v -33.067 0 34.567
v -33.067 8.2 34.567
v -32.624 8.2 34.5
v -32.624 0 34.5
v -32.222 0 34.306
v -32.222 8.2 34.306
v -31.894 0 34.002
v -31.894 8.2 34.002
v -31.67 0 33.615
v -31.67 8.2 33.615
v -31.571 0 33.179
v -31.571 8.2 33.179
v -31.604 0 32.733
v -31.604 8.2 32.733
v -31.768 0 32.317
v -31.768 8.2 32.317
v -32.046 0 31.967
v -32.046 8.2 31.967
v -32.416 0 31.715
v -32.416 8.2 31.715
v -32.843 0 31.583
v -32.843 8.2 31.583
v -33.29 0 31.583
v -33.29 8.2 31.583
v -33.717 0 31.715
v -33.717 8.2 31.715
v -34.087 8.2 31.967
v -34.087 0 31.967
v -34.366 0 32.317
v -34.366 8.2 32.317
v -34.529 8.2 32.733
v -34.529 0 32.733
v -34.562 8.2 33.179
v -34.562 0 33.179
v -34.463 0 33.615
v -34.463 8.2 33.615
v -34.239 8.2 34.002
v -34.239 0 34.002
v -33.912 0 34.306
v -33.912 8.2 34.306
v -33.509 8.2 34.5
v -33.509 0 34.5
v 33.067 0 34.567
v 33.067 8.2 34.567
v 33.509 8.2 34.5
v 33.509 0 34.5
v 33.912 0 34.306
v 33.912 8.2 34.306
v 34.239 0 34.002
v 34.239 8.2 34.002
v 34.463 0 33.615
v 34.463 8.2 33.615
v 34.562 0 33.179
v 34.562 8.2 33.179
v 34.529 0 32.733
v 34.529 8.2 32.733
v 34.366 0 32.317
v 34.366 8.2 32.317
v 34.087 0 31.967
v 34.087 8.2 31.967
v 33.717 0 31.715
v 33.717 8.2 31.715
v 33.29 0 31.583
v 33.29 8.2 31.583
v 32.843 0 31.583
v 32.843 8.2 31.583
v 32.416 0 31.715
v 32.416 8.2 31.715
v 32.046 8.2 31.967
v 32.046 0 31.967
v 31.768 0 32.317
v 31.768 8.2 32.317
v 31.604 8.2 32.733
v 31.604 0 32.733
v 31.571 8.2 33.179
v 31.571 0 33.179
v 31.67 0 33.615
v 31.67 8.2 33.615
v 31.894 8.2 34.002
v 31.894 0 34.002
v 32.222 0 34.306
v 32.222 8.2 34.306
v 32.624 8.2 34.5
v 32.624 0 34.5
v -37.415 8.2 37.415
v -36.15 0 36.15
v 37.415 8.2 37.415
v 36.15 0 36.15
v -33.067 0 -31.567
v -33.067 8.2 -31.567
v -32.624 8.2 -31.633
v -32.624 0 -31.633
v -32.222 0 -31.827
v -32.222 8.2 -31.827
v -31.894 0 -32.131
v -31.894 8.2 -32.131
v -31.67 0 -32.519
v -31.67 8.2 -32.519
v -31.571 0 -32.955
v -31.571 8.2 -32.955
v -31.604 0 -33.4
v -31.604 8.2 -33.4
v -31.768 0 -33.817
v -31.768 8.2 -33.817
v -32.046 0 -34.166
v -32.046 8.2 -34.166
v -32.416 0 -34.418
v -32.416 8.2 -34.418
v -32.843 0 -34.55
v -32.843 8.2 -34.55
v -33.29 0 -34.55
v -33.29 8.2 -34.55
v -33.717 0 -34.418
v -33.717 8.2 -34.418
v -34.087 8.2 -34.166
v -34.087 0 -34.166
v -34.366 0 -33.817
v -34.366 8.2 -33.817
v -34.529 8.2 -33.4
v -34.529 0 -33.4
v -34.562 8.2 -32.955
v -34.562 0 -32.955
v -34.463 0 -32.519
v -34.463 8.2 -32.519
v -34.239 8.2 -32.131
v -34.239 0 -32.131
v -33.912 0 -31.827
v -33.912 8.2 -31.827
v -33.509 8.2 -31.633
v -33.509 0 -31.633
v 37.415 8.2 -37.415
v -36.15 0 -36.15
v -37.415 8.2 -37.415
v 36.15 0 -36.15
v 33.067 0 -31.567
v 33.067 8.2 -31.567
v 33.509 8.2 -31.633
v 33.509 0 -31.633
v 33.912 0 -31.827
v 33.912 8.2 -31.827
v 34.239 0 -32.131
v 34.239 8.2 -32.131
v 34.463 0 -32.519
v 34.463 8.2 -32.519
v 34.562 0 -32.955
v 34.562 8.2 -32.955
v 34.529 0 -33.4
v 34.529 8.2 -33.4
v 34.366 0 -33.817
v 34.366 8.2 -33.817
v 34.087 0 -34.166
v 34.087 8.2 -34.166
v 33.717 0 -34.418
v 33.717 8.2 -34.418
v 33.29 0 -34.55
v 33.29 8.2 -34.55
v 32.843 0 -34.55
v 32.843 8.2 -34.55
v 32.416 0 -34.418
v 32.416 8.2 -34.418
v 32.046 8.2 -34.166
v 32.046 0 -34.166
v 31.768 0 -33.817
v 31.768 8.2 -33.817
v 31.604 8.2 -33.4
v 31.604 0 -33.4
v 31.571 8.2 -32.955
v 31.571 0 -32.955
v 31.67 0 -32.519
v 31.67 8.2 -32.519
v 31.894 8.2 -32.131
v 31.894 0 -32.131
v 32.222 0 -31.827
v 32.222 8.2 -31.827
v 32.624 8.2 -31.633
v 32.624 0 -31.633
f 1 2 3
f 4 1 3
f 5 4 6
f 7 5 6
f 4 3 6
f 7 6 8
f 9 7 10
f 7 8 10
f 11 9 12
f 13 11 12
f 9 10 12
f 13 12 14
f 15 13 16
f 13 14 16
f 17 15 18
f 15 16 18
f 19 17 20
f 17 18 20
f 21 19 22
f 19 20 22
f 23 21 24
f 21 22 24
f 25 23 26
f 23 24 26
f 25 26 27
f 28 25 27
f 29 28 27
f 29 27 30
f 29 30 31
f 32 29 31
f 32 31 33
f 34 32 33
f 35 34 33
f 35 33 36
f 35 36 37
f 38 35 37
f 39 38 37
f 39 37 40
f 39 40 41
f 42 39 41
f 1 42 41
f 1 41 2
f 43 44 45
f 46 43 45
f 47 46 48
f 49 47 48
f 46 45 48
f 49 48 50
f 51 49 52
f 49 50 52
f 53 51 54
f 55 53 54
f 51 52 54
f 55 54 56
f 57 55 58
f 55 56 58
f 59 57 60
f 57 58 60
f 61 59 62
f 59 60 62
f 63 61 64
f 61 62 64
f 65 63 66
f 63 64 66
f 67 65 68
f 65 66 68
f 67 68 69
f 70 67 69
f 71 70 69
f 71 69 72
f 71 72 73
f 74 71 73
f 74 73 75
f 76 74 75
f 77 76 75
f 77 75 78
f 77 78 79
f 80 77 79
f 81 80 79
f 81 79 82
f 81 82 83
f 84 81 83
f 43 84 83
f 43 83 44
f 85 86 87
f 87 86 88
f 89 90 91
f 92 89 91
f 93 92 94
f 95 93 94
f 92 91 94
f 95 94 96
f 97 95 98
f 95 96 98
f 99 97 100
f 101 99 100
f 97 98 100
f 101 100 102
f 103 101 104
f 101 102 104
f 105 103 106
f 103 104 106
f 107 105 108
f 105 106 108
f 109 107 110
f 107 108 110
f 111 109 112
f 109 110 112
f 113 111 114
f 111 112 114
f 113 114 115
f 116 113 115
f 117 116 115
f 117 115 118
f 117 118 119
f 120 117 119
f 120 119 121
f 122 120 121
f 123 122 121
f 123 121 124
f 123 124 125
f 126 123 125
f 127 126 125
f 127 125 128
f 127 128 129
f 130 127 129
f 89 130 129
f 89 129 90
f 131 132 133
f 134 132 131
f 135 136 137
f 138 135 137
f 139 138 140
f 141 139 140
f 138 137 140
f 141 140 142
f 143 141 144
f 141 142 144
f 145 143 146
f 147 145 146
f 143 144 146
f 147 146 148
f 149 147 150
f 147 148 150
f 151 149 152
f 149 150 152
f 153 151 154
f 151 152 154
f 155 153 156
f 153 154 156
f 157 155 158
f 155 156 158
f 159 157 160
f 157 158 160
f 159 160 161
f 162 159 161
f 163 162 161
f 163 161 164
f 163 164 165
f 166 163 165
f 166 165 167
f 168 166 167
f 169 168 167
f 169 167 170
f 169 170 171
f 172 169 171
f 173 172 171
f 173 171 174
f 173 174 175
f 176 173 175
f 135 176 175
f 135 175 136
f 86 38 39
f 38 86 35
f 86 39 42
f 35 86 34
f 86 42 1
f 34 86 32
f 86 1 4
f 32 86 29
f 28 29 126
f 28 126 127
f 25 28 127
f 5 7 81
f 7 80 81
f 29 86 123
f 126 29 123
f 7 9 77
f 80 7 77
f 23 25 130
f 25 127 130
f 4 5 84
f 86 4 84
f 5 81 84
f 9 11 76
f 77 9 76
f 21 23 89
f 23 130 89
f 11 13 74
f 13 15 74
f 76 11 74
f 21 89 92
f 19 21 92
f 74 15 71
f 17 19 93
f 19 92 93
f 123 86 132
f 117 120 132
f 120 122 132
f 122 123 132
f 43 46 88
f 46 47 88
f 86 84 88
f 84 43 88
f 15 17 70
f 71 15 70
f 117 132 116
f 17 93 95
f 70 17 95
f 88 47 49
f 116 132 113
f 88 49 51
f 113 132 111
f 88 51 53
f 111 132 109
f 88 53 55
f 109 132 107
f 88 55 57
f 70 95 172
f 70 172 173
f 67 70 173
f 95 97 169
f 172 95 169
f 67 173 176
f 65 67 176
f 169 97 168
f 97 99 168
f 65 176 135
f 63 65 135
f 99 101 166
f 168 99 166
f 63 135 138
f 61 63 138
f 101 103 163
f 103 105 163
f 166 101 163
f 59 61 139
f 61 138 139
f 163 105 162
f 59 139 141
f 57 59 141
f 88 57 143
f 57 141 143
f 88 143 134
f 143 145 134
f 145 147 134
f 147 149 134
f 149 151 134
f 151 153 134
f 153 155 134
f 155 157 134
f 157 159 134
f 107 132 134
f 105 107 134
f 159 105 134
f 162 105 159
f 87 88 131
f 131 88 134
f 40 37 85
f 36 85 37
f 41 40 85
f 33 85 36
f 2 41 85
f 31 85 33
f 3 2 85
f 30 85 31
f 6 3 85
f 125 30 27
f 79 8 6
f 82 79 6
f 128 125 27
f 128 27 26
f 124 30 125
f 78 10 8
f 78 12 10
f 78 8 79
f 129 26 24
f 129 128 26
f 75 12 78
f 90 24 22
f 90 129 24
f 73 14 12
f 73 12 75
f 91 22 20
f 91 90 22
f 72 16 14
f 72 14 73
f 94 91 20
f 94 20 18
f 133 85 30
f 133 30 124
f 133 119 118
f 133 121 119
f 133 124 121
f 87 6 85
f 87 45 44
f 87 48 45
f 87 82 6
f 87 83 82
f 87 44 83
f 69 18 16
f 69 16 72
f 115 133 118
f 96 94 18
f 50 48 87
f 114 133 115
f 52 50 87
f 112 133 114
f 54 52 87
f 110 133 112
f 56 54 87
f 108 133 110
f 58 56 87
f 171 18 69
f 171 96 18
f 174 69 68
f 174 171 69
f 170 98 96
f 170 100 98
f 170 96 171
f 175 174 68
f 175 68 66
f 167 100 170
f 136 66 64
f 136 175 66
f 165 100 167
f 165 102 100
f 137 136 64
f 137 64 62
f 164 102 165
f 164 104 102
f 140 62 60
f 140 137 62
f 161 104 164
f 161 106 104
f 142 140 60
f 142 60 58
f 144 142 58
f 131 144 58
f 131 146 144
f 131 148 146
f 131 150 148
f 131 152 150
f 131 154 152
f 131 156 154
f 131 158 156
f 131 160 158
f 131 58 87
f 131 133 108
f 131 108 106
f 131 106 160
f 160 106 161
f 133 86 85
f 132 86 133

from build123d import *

# Parameters (mm, degrees)
SKETCH1_W           = 72.3
SKETCH1_H           = 72.3
BOSS_EXTRUDE1_DEPTH = 8.2
BOSS_EXTRUDE1_DRAFT = -8.77
SKETCH2_R           = 1.5
CUT_EXTRUDE1_DEPTH  = 10


with BuildPart() as part:
    # Sketch1 → Boss-Extrude1 (with draft: the straight prism first)
    with BuildSketch(Plane(origin=(0, 0, 0), x_dir=(1, 0, 0), z_dir=(0, 1, 0))):
        Rectangle(SKETCH1_W, SKETCH1_H)
    extrude(amount=BOSS_EXTRUDE1_DEPTH)
    # Boss-Extrude1: the draft: its side faces are tilted about the plane it starts from
    boss_extrude1_sides = [part.faces().sort_by_distance(p)[0] for p in [
        (-36.15, 4.1, 0),
        (0, 4.1, 36.15),
        (36.15, 4.1, 0),
        (0, 4.1, -36.15),
    ]]
    draft(boss_extrude1_sides, Plane(origin=(0, 0, 0), x_dir=(1, 0, 0), z_dir=(0, 1, 0)), BOSS_EXTRUDE1_DRAFT)

    # Sketch2 → Cut-Extrude1 (cut)
    with BuildSketch(Plane(origin=(0, 8.2, 0), x_dir=(1, 0, 0), z_dir=(0, 1, 0))):
        with Locations(Location((-33.066601018, 33.066601018, 0), (0, 0, 270))):
            Circle(SKETCH2_R)
        with Locations(Location((33.066601018, 33.066601018, 0), (0, 0, 270))):
            Circle(SKETCH2_R)
        with Locations(Location((33.066601018, -33.066601018, 0), (0, 0, 270))):
            Circle(SKETCH2_R)
        with Locations(Location((-33.066601018, -33.066601018, 0), (0, 0, 270))):
            Circle(SKETCH2_R)
    extrude(amount=-CUT_EXTRUDE1_DEPTH, mode=Mode.SUBTRACT)


solid = part.part
